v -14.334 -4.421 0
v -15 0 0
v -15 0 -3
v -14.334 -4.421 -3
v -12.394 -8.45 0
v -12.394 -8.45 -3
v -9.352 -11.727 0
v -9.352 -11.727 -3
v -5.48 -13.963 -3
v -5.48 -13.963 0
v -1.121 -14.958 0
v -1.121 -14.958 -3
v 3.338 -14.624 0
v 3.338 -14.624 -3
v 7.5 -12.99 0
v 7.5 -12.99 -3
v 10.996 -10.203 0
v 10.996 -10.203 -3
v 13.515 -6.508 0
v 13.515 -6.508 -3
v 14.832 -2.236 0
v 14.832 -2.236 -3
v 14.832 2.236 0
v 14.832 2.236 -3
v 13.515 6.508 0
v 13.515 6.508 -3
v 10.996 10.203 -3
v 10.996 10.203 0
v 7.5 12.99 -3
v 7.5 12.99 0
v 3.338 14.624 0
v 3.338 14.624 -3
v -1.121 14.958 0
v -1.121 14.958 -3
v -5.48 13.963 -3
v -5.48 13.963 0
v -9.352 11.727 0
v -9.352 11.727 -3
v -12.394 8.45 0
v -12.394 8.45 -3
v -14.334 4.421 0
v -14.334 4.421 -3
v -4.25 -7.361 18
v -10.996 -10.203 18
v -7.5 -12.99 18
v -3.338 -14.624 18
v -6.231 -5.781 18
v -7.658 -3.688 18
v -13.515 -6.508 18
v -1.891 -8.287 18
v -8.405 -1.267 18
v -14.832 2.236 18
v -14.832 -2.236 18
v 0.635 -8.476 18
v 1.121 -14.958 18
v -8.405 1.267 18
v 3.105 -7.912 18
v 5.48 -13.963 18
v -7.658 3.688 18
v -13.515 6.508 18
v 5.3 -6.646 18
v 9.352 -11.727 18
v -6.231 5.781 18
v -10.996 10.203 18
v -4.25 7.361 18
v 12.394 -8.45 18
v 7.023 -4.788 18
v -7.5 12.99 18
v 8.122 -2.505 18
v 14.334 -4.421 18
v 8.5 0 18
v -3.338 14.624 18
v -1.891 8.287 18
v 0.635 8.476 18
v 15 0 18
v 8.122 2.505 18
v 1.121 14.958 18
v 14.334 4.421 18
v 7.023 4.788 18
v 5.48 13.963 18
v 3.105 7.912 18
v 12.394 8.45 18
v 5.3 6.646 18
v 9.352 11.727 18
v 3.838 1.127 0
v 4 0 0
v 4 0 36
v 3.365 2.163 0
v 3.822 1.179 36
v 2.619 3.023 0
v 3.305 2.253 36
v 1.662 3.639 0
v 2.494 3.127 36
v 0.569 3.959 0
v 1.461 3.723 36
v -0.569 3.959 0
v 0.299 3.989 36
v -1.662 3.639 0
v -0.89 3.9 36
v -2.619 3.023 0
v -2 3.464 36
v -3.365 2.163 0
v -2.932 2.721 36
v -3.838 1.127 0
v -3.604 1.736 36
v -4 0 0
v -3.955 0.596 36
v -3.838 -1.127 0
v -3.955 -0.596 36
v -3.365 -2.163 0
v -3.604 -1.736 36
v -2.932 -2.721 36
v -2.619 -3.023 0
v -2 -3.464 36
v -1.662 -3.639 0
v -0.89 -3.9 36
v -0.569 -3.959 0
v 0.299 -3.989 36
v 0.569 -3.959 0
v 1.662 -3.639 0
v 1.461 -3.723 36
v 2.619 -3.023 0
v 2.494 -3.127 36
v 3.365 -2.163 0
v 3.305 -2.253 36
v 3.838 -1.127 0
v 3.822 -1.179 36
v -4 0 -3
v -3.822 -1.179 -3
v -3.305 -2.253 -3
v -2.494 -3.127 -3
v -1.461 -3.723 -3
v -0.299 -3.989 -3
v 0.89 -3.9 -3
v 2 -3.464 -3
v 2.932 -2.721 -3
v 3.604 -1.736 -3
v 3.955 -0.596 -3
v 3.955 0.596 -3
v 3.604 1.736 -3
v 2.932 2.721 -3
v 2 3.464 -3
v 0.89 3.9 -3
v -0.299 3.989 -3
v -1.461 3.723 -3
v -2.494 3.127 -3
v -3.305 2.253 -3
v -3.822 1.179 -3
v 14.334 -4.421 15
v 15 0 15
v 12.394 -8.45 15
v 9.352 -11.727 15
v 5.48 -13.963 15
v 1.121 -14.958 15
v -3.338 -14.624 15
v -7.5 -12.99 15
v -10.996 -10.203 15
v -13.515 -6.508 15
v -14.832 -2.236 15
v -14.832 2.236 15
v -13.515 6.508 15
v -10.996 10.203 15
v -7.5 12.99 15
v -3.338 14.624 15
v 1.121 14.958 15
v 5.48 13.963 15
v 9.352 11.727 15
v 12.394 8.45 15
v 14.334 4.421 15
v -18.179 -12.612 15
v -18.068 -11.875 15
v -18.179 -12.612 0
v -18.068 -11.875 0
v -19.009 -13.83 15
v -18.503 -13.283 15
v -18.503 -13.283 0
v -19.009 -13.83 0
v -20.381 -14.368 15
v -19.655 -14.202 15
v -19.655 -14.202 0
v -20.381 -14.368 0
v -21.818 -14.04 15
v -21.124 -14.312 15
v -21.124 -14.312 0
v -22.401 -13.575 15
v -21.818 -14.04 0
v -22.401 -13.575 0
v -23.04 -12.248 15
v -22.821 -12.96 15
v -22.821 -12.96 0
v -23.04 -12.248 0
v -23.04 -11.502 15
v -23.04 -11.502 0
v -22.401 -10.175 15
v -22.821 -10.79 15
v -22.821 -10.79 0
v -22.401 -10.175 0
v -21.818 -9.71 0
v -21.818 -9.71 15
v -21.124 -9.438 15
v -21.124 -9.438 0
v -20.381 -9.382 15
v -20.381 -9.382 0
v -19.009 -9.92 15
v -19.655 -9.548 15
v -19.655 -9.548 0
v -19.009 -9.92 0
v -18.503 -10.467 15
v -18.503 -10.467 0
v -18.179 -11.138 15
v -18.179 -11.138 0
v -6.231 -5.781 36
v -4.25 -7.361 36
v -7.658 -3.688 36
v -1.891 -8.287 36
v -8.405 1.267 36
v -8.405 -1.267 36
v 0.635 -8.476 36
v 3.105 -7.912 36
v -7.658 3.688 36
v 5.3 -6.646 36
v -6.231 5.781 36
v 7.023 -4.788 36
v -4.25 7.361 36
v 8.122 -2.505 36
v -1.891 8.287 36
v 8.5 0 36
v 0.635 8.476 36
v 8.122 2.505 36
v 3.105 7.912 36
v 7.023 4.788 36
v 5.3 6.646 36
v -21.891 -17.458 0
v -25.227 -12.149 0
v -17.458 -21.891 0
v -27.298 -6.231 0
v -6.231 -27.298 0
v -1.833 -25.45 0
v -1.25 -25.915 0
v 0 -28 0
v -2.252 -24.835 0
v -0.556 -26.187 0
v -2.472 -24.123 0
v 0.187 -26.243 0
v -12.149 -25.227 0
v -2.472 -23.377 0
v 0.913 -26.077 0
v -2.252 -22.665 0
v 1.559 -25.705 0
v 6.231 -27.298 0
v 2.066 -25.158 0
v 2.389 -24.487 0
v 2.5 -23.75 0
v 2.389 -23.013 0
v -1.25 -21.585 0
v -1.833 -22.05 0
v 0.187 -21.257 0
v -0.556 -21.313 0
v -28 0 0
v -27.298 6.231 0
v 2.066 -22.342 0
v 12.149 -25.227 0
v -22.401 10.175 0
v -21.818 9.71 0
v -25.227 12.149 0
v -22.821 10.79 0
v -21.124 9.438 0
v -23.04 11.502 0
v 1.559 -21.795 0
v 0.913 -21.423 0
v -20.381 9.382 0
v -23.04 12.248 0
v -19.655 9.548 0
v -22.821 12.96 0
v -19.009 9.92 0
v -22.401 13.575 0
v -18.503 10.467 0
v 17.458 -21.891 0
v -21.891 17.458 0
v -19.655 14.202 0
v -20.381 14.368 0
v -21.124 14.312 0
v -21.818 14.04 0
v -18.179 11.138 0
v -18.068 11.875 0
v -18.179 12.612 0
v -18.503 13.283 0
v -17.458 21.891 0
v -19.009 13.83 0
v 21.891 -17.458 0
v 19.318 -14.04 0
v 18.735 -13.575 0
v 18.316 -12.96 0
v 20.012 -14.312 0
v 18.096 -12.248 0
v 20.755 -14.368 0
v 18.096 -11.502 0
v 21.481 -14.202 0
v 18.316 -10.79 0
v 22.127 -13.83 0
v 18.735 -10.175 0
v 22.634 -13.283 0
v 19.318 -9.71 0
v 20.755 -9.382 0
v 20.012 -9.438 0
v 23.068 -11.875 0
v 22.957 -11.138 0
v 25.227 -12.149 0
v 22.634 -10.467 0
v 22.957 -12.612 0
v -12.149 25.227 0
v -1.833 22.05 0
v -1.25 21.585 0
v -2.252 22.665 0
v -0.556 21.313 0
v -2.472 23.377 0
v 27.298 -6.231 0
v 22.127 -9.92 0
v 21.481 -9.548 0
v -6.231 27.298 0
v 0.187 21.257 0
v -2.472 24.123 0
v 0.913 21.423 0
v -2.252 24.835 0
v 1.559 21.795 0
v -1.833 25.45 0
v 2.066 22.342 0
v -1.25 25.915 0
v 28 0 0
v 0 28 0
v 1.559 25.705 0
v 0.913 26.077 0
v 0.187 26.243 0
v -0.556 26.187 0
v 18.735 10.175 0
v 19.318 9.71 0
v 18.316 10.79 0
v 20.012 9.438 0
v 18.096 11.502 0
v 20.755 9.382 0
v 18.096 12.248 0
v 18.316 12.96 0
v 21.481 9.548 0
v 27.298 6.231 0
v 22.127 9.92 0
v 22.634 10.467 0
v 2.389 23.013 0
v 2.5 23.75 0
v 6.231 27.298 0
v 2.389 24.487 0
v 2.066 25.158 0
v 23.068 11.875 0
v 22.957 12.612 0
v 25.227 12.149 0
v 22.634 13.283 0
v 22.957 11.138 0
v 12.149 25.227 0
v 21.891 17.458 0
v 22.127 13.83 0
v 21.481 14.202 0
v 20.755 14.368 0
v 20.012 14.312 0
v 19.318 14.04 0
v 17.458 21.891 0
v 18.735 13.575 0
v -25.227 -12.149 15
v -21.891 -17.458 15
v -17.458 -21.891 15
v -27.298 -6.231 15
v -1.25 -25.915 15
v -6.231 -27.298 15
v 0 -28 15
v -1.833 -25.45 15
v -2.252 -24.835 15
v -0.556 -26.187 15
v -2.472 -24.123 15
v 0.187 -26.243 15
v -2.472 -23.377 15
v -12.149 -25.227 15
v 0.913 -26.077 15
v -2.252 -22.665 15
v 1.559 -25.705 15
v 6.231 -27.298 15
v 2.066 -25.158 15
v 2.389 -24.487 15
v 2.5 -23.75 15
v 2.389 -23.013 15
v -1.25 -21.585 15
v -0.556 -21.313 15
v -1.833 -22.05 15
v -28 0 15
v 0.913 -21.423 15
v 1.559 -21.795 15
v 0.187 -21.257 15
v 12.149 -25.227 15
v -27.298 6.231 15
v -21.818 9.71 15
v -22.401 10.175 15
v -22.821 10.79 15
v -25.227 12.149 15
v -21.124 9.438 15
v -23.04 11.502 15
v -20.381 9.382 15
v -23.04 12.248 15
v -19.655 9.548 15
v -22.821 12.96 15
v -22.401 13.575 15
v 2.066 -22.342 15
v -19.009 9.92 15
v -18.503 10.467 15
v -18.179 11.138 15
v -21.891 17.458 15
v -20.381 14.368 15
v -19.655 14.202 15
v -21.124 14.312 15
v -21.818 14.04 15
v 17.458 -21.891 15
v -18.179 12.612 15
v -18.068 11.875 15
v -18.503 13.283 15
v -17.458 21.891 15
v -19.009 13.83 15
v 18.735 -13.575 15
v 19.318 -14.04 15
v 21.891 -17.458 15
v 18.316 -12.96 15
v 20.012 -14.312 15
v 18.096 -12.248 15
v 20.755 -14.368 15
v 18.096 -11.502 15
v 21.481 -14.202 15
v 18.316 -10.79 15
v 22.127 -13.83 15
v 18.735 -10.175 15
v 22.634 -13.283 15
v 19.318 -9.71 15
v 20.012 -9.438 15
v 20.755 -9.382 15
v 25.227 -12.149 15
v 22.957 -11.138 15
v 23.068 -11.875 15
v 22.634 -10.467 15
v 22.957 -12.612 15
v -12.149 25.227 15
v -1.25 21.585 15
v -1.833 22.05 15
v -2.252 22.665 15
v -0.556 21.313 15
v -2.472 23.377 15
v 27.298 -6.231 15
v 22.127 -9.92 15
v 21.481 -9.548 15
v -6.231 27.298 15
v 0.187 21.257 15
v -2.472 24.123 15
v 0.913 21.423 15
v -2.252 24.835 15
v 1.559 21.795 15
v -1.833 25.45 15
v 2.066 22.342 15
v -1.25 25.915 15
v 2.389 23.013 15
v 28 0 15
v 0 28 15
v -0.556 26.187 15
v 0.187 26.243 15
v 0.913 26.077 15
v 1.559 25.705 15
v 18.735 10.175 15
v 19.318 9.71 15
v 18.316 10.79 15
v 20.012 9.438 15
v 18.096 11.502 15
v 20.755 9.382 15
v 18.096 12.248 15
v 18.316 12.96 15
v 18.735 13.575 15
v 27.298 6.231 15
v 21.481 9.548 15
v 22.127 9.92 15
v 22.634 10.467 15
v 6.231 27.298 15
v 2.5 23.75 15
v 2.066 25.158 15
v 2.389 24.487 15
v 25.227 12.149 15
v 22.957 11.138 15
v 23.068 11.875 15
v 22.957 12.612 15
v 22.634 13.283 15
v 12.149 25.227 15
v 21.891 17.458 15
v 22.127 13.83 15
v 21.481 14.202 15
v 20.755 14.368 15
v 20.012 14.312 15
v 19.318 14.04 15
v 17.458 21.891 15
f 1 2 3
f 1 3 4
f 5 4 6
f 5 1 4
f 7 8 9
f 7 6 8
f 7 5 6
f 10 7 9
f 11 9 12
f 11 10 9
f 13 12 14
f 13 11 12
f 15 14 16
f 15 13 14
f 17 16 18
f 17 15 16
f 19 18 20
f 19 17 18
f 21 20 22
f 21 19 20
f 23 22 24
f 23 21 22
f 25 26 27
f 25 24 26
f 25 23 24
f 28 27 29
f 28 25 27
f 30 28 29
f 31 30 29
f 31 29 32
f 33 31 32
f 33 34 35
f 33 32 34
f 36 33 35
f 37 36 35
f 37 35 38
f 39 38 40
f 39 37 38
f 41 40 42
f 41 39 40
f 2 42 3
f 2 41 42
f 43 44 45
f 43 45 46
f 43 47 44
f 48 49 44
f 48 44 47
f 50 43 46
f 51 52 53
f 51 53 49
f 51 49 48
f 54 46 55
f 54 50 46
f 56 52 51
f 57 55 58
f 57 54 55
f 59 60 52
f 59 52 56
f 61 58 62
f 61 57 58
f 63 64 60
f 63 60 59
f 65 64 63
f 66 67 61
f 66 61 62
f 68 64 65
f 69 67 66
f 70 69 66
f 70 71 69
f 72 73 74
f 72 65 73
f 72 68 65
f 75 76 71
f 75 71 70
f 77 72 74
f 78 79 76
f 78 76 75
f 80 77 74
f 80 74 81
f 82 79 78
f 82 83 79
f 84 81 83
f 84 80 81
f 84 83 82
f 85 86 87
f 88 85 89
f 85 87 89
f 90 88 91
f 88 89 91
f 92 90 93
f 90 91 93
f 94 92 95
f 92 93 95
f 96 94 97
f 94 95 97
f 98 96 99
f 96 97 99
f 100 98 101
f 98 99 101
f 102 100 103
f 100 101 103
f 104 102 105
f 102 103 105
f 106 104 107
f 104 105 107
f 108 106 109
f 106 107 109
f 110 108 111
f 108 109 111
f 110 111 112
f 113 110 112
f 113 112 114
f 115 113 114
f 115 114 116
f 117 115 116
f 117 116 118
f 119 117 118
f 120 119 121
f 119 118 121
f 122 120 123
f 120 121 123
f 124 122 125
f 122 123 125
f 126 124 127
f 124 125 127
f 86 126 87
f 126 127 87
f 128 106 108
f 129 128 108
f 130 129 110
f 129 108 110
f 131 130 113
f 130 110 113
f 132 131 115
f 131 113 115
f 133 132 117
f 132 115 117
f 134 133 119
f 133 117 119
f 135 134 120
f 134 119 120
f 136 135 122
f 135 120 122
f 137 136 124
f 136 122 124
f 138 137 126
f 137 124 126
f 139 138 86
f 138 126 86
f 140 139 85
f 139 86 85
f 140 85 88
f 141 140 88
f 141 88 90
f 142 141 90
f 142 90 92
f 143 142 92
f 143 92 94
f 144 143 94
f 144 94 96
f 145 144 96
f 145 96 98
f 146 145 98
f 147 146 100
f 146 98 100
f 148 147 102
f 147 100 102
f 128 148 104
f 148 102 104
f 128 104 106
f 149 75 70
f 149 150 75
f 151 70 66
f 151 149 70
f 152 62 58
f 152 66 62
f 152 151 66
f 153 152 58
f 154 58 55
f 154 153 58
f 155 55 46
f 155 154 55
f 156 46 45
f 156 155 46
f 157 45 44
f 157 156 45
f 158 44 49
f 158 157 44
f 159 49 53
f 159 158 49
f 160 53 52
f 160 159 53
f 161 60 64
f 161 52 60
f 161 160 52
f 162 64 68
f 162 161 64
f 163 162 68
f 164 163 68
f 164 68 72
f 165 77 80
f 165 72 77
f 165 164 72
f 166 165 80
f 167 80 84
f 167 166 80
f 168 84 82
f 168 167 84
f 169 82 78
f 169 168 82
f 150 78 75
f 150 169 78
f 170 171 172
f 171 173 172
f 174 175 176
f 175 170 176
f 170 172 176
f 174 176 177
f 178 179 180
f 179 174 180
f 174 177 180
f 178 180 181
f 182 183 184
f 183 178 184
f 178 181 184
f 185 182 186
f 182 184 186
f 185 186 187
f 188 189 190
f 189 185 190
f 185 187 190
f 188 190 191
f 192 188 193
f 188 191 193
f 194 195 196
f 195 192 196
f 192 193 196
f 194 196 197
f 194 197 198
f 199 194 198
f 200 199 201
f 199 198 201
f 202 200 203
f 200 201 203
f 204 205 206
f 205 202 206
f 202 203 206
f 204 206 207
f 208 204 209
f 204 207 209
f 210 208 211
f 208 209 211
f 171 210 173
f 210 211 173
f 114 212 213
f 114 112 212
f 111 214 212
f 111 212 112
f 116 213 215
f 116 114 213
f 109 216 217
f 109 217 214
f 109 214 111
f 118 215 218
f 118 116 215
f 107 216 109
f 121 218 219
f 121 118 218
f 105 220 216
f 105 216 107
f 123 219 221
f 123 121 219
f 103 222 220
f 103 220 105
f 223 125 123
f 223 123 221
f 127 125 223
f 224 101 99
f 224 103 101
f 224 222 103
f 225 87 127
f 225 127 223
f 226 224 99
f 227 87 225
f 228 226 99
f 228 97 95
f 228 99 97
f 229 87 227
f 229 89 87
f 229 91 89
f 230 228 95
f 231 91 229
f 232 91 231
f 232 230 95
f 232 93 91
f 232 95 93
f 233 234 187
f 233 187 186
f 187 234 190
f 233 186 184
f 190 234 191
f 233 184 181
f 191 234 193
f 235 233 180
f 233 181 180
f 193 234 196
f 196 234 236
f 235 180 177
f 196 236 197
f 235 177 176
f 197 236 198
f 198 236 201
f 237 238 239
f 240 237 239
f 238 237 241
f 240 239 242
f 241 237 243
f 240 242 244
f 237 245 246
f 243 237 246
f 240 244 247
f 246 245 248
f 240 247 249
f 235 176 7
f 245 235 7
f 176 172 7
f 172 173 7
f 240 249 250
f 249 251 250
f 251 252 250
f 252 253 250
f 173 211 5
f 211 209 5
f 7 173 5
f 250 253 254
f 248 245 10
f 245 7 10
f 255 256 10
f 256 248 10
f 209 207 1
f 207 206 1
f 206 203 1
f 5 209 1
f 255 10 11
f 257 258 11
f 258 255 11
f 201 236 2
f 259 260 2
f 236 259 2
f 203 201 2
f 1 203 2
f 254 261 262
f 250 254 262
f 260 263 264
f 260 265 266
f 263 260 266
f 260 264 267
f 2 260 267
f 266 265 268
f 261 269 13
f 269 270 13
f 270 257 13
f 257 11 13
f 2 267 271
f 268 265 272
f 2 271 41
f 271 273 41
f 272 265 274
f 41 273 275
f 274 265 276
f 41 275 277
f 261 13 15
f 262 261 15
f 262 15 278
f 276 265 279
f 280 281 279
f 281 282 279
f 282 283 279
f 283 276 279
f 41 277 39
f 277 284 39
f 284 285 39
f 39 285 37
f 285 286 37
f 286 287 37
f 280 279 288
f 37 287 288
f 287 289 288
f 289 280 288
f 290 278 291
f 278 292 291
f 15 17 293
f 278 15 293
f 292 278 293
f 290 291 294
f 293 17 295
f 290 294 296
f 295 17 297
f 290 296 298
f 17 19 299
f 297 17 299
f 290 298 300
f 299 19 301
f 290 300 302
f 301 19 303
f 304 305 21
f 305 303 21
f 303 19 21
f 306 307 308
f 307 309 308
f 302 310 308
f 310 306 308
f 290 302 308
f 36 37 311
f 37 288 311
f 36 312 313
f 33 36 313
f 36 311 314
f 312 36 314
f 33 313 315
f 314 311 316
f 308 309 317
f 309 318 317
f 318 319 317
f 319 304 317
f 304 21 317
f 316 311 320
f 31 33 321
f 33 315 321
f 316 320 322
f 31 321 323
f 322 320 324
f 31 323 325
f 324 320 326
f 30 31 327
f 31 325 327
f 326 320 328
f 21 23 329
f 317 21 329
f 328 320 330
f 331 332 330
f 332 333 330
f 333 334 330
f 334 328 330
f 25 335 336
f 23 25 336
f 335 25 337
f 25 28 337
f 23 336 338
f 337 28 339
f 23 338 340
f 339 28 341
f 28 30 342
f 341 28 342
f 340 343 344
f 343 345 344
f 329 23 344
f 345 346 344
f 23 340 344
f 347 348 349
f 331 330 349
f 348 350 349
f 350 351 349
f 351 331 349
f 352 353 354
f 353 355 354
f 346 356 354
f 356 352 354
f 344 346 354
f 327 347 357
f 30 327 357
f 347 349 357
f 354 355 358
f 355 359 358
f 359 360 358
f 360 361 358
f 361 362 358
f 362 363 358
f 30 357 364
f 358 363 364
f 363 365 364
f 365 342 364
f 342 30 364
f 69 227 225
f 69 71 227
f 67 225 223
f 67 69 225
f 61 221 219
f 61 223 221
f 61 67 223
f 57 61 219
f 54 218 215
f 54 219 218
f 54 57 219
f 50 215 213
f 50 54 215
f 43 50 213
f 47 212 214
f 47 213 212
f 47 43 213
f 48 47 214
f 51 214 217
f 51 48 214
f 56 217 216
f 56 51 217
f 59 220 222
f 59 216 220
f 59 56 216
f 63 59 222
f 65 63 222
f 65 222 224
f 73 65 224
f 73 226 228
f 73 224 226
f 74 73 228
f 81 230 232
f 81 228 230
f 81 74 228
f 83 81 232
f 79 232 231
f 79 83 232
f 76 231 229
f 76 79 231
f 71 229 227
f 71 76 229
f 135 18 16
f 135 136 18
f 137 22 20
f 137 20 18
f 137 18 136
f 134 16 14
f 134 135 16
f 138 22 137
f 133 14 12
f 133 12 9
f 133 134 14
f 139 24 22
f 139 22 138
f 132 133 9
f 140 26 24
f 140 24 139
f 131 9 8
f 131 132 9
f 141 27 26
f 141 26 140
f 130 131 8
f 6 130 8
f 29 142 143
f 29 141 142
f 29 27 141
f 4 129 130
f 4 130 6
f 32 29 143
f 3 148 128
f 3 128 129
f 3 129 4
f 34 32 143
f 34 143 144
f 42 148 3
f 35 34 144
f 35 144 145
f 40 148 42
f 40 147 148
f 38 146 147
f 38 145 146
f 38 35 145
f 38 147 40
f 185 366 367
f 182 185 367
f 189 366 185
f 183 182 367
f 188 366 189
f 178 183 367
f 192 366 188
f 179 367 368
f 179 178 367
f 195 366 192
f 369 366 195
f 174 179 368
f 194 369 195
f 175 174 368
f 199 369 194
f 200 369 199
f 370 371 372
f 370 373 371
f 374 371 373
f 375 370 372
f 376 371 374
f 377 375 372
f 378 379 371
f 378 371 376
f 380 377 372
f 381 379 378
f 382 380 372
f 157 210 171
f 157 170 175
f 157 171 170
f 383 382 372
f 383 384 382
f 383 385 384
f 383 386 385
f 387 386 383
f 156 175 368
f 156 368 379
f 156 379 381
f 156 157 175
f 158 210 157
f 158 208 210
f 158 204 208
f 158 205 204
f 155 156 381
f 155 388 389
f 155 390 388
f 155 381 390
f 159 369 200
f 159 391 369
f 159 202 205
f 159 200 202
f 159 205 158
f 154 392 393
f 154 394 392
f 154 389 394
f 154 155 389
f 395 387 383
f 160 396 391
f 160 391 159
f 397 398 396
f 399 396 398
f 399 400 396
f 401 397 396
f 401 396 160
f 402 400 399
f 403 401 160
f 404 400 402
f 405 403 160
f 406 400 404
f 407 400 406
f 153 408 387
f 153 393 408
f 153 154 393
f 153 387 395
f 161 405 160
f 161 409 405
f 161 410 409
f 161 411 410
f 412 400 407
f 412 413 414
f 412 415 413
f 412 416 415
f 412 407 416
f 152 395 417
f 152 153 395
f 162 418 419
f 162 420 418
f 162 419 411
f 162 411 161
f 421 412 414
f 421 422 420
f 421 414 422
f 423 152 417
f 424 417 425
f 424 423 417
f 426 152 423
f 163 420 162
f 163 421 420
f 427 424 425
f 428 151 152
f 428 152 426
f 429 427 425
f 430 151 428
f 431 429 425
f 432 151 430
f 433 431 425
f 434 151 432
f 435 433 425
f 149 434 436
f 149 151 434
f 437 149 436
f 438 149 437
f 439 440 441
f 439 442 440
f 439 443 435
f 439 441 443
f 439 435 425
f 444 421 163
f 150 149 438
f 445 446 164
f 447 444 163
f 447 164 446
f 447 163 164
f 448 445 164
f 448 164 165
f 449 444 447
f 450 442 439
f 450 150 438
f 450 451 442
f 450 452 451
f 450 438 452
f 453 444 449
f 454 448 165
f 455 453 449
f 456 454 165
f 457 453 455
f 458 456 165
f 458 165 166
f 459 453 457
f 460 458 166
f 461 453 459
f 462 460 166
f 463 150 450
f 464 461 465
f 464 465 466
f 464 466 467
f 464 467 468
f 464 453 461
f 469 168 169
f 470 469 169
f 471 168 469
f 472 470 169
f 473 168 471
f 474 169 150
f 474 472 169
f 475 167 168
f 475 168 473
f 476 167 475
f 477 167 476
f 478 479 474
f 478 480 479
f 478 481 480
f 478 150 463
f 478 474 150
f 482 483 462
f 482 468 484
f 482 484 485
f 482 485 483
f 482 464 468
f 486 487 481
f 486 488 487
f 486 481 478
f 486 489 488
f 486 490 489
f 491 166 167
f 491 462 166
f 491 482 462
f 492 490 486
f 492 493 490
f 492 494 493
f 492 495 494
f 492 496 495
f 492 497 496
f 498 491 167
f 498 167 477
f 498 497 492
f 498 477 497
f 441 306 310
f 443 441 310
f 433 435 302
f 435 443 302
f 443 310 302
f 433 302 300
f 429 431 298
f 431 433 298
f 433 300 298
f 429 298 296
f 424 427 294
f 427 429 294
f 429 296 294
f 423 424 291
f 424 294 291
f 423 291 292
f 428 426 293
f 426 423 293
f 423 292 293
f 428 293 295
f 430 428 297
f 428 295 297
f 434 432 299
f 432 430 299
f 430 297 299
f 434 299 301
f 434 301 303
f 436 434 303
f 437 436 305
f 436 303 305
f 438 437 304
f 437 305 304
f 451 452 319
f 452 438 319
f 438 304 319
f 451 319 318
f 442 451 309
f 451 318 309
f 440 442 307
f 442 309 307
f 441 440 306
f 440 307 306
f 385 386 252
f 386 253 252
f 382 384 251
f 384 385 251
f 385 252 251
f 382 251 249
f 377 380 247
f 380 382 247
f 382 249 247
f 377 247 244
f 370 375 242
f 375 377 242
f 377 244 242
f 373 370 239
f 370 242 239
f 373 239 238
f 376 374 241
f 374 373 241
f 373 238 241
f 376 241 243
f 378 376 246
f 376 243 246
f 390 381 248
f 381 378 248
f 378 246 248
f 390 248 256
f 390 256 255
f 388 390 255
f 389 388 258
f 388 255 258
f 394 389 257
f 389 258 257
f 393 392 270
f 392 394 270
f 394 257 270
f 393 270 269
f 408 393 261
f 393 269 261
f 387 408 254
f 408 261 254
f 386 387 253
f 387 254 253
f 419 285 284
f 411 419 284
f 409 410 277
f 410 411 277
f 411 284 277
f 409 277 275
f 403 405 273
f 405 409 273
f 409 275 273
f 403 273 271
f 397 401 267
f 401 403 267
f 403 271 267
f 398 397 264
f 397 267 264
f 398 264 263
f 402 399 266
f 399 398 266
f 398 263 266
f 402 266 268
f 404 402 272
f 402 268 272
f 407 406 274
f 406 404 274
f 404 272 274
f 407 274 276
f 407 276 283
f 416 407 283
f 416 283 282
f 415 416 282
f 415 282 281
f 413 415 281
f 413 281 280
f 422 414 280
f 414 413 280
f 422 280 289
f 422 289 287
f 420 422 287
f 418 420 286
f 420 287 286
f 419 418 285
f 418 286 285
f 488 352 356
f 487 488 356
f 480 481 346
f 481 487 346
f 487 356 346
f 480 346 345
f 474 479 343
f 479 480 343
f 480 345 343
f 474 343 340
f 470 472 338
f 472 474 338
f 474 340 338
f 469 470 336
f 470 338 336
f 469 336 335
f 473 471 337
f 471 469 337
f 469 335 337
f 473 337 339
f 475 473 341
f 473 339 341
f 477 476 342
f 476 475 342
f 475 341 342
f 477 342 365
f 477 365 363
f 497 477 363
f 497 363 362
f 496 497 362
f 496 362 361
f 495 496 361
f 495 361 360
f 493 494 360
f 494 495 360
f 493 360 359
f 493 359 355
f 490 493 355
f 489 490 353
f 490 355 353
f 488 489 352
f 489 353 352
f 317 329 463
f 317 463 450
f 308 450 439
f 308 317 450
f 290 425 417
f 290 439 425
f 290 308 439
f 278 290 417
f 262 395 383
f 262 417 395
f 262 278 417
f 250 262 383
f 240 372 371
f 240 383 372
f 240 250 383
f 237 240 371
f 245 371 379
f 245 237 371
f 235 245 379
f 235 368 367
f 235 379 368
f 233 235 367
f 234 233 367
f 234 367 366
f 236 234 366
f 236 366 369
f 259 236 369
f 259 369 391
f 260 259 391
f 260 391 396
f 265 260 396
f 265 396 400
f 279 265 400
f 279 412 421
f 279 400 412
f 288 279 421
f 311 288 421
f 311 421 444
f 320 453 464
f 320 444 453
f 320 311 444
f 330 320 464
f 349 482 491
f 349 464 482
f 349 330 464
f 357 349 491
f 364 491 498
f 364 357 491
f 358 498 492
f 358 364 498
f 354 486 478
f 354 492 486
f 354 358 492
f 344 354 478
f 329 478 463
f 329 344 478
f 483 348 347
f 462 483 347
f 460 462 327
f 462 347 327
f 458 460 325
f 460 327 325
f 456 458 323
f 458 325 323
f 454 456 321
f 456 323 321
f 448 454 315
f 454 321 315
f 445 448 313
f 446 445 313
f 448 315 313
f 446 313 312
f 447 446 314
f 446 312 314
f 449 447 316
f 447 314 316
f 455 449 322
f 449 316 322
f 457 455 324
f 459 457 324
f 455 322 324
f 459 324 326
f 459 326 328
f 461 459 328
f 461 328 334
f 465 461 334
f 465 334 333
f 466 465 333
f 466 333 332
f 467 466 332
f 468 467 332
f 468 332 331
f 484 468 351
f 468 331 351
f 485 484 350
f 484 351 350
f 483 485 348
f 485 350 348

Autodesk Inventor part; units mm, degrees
ref_plane "YZ Plane" through (0, 0, 0) normal (1, 0, 0) x (0, 1, 0)
ref_plane "XZ Plane" through (0, 0, 0) normal (0, 1, 0) x (-1, 0, 0)
ref_plane "XY Plane" through (0, 0, 0) normal (0, 0, 1) x (1, 0, 0)
sketch "Sketch1" plane through (0, 0, 0) normal (0, 0, 1) x (1, 0, 0)
  circle A0 centre (0, 0) radius 28
  line L0 (0, 0) -> (0, 23.75)
  circle A1 centre (0, 23.75) radius 2.5
  circle A2 centre (-20.5681, 11.875) radius 2.5
  circle A3 centre (-20.5681, -11.875) radius 2.5
  circle A4 centre (0, -23.75) radius 2.5
  circle A5 centre (20.5681, -11.875) radius 2.5
  circle A6 centre (20.5681, 11.875) radius 2.5
  dimension "d3" = 56
  dimension "d4" = 23.75
  dimension "d5" = 5
  dimension "d6" = 360
extrude "Extrusion1" add sketch "Sketch1" along normal blind 15
sketch "Sketch2" plane through (0, 0, 15) normal (0, 0, 1) x (1, 0, 0)
  circle A0 centre (0, 0) radius 15
  dimension "d9" = 30
extrude "Extrusion2" add sketch "Sketch2" along normal blind 3
sketch "Sketch3" plane through (0, 0, 18) normal (0, 0, 1) x (1, 0, 0)
  circle A0 centre (0, 0) radius 8.5
  dimension "d12" = 17
extrude "Extrusion3" add sketch "Sketch3" along normal blind 18
sketch "Sketch4" plane through (0, 0, 36) normal (0, 0, 1) x (1, 0, 0)
  circle A0 centre (0, 0) radius 4
  dimension "d15" = 8
extrude "Extrusion4" cut sketch "Sketch4" against normal through all
sketch "Sketch5" plane through (0, 0, 0) normal (0, 0, -1) x (-1, 0, 0)
  circle A0 centre (0, 0) radius 15
  circle A1 centre (0, 0) radius 4 projected
  dimension "d18" = 30
extrude "Extrusion5" add sketch "Sketch5" along normal blind 3
properties part number "HubOmni1" material "Iron, Cast"
